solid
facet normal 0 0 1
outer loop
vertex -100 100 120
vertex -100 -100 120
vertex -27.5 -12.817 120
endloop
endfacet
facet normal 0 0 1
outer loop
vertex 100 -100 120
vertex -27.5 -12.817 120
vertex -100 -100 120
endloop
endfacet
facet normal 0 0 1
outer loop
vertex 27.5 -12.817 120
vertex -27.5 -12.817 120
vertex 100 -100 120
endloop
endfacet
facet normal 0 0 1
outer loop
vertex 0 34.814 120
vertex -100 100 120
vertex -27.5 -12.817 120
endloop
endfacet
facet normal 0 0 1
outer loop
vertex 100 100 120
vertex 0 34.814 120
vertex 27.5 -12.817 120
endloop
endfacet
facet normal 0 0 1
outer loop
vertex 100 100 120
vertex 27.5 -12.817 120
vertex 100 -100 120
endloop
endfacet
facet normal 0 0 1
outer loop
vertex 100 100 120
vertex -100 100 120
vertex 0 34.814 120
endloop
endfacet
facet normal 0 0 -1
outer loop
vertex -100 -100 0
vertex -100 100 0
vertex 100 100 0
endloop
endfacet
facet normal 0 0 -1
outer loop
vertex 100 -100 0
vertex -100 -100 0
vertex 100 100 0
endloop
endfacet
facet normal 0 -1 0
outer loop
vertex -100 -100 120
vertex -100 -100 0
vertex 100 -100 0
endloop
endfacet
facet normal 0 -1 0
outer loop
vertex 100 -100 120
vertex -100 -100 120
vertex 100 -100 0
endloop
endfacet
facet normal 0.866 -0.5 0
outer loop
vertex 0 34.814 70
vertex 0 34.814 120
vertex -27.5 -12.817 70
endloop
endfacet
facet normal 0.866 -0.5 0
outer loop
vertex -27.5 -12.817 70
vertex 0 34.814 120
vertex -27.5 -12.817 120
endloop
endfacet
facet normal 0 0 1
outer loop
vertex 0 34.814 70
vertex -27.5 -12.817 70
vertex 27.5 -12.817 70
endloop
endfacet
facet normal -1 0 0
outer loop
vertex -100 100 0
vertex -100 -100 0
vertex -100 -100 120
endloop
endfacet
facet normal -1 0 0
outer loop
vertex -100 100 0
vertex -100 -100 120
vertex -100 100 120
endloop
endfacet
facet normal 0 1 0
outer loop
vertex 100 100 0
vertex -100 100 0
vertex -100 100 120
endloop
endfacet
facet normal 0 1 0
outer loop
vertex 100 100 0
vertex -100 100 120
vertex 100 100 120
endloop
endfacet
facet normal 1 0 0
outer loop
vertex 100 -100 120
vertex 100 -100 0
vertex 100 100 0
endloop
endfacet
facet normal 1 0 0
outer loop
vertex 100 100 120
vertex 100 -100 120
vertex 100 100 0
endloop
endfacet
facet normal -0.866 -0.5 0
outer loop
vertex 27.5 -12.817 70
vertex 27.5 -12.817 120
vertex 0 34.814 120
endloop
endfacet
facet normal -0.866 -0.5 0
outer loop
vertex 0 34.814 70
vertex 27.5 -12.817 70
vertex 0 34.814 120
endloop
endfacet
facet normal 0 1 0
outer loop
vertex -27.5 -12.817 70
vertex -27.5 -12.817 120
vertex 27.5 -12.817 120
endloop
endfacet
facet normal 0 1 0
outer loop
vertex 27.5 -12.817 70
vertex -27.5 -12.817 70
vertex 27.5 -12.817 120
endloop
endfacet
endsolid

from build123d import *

# Parameters (mm, degrees)
F0_W     = 200
F0_H     = 200
F1_DEPTH = 120
F3_DEPTH = 50


with BuildPart() as f1:
    # F0 (on Top) → F1 (new body)
    with BuildSketch(Plane.XY):
        Rectangle(F0_W, F0_H)
    extrude(amount=F1_DEPTH)

    # F2 (on face) → F3 (cut)
    with BuildSketch(Plane.XY.offset(120)):
        Polygon((-27.5, -12.817176), (27.5, -12.817176), (0, 34.814221), align=None)
    extrude(amount=-F3_DEPTH, mode=Mode.SUBTRACT)


solid = f1.part
